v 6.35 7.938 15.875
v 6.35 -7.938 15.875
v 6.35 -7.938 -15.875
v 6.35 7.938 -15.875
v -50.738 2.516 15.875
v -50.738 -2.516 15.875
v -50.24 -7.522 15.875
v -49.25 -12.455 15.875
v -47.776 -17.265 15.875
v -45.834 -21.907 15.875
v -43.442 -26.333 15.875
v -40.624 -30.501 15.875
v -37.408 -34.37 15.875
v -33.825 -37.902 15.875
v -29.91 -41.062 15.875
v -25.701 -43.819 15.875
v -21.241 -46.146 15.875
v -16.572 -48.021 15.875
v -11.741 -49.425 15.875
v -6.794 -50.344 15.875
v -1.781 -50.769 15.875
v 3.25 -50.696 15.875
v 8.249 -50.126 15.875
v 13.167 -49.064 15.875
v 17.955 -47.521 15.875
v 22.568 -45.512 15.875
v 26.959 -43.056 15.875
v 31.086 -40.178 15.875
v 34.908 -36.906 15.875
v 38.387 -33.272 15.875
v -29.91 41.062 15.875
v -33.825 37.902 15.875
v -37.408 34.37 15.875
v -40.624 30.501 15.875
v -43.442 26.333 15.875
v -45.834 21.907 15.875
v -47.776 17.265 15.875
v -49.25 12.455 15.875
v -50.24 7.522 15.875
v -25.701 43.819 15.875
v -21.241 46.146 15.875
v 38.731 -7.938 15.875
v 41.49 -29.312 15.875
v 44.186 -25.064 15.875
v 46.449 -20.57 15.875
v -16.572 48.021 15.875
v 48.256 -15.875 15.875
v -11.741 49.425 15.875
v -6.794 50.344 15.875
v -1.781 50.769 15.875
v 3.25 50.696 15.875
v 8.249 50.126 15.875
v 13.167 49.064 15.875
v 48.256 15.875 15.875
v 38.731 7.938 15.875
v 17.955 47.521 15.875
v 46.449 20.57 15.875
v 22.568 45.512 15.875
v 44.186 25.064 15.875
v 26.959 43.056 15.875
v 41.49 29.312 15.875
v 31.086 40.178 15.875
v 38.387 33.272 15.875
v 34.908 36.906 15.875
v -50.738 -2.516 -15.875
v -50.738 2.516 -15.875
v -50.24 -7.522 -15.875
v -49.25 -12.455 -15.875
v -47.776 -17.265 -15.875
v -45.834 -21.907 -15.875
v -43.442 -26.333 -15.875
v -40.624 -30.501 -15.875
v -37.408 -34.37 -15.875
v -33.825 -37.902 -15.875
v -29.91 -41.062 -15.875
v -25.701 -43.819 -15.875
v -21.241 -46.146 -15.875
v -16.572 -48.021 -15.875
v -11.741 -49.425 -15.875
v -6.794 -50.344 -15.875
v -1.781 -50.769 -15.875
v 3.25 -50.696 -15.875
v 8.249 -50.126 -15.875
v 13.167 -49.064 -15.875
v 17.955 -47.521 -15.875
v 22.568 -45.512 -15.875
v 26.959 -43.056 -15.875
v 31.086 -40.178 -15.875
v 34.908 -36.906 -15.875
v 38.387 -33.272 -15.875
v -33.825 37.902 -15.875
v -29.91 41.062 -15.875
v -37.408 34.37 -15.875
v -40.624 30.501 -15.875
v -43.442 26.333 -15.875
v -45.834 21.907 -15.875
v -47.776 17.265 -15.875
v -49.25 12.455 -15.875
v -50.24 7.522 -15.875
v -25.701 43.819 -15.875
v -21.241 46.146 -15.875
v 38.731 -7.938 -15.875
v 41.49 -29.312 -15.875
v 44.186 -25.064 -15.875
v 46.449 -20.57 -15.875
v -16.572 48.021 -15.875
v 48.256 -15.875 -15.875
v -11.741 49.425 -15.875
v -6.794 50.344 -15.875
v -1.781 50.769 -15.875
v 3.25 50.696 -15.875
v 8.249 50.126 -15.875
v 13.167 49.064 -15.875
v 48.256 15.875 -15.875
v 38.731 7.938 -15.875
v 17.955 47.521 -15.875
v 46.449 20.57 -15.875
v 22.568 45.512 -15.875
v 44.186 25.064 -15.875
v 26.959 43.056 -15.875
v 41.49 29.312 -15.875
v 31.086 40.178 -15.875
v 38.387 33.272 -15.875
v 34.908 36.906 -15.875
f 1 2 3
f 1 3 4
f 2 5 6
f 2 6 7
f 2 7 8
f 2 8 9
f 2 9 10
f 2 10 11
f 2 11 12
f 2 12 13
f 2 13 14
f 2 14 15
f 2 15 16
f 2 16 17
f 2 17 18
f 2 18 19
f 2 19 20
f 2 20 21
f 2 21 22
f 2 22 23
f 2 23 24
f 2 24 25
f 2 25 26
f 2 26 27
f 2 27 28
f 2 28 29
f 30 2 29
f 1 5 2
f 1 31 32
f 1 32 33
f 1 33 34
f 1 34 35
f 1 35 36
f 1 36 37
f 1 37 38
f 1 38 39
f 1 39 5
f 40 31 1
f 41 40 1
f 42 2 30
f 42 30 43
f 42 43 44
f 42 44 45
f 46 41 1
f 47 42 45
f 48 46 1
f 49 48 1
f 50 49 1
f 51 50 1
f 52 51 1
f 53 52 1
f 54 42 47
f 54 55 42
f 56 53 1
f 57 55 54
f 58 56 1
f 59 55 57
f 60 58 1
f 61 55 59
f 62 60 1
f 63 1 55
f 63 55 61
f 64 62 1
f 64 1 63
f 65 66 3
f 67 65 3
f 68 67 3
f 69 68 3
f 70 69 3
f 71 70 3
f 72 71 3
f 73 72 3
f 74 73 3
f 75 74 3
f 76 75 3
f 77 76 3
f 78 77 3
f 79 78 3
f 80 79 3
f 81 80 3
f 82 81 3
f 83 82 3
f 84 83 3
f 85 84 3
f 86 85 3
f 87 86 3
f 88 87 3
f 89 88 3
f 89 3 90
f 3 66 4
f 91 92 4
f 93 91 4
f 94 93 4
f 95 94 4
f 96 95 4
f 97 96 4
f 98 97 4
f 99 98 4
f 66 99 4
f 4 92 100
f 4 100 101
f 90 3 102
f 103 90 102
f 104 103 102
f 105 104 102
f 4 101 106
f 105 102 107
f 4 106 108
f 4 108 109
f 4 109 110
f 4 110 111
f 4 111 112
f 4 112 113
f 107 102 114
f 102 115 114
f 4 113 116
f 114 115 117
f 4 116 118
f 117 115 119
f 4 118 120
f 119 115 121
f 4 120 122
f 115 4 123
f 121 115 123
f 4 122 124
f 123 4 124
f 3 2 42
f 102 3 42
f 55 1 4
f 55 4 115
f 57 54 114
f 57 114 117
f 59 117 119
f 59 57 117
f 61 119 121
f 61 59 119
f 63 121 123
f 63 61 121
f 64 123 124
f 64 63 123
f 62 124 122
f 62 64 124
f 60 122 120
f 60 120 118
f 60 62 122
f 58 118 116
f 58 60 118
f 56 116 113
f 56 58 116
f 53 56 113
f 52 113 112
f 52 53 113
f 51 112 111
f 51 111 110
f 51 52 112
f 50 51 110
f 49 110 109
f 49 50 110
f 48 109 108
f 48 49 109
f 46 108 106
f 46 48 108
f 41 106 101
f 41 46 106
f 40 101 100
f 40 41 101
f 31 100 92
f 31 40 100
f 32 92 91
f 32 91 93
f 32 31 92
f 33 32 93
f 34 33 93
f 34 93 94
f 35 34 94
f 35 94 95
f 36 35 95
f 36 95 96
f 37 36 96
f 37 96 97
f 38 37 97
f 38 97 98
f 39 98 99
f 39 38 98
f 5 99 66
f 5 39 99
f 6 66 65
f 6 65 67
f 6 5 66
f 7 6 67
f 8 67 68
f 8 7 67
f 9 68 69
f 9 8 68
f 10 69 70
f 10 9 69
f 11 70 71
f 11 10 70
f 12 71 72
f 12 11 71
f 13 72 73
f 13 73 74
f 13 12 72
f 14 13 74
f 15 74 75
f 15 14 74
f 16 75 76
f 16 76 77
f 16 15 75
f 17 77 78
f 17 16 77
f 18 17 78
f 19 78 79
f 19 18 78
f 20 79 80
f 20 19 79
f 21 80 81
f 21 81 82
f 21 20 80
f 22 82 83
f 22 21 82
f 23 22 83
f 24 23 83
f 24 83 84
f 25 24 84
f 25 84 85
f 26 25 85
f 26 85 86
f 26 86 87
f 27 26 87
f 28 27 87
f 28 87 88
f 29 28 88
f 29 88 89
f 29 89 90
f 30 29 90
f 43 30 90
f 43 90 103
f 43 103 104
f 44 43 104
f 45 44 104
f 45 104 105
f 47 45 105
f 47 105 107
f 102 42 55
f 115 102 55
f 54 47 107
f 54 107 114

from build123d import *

# Parameters (mm, degrees)
F0_R     = 50.8
F1_DEPTH = 15.875
F2_W     = 2.544178
F2_H     = 31.75
F3_DEPTH = 31.75
F4_W     = 32.380822
F4_H     = 15.875
F5_DEPTH = 31.75


with BuildPart() as f1:
    # F0 (on Top) → F1 (new body, symmetric)
    with BuildSketch(Plane.XY):
        Circle(F0_R)
    extrude(amount=F1_DEPTH, both=True)

    # F2 (on face) → F3 (cut, through all)
    with BuildSketch(Plane.XY.offset(15.875)):
        with Locations((49.527911, 0)):
            Rectangle(F2_W, F2_H)
    extrude(amount=-F3_DEPTH, mode=Mode.SUBTRACT)

    # F4 (on face) → F5 (cut, through all)
    with BuildSketch(Plane.XY.offset(15.875)):
        with Locations((22.540411, 0)):
            Rectangle(F4_W, F4_H)
    extrude(amount=-F5_DEPTH, mode=Mode.SUBTRACT)


solid = f1.part
